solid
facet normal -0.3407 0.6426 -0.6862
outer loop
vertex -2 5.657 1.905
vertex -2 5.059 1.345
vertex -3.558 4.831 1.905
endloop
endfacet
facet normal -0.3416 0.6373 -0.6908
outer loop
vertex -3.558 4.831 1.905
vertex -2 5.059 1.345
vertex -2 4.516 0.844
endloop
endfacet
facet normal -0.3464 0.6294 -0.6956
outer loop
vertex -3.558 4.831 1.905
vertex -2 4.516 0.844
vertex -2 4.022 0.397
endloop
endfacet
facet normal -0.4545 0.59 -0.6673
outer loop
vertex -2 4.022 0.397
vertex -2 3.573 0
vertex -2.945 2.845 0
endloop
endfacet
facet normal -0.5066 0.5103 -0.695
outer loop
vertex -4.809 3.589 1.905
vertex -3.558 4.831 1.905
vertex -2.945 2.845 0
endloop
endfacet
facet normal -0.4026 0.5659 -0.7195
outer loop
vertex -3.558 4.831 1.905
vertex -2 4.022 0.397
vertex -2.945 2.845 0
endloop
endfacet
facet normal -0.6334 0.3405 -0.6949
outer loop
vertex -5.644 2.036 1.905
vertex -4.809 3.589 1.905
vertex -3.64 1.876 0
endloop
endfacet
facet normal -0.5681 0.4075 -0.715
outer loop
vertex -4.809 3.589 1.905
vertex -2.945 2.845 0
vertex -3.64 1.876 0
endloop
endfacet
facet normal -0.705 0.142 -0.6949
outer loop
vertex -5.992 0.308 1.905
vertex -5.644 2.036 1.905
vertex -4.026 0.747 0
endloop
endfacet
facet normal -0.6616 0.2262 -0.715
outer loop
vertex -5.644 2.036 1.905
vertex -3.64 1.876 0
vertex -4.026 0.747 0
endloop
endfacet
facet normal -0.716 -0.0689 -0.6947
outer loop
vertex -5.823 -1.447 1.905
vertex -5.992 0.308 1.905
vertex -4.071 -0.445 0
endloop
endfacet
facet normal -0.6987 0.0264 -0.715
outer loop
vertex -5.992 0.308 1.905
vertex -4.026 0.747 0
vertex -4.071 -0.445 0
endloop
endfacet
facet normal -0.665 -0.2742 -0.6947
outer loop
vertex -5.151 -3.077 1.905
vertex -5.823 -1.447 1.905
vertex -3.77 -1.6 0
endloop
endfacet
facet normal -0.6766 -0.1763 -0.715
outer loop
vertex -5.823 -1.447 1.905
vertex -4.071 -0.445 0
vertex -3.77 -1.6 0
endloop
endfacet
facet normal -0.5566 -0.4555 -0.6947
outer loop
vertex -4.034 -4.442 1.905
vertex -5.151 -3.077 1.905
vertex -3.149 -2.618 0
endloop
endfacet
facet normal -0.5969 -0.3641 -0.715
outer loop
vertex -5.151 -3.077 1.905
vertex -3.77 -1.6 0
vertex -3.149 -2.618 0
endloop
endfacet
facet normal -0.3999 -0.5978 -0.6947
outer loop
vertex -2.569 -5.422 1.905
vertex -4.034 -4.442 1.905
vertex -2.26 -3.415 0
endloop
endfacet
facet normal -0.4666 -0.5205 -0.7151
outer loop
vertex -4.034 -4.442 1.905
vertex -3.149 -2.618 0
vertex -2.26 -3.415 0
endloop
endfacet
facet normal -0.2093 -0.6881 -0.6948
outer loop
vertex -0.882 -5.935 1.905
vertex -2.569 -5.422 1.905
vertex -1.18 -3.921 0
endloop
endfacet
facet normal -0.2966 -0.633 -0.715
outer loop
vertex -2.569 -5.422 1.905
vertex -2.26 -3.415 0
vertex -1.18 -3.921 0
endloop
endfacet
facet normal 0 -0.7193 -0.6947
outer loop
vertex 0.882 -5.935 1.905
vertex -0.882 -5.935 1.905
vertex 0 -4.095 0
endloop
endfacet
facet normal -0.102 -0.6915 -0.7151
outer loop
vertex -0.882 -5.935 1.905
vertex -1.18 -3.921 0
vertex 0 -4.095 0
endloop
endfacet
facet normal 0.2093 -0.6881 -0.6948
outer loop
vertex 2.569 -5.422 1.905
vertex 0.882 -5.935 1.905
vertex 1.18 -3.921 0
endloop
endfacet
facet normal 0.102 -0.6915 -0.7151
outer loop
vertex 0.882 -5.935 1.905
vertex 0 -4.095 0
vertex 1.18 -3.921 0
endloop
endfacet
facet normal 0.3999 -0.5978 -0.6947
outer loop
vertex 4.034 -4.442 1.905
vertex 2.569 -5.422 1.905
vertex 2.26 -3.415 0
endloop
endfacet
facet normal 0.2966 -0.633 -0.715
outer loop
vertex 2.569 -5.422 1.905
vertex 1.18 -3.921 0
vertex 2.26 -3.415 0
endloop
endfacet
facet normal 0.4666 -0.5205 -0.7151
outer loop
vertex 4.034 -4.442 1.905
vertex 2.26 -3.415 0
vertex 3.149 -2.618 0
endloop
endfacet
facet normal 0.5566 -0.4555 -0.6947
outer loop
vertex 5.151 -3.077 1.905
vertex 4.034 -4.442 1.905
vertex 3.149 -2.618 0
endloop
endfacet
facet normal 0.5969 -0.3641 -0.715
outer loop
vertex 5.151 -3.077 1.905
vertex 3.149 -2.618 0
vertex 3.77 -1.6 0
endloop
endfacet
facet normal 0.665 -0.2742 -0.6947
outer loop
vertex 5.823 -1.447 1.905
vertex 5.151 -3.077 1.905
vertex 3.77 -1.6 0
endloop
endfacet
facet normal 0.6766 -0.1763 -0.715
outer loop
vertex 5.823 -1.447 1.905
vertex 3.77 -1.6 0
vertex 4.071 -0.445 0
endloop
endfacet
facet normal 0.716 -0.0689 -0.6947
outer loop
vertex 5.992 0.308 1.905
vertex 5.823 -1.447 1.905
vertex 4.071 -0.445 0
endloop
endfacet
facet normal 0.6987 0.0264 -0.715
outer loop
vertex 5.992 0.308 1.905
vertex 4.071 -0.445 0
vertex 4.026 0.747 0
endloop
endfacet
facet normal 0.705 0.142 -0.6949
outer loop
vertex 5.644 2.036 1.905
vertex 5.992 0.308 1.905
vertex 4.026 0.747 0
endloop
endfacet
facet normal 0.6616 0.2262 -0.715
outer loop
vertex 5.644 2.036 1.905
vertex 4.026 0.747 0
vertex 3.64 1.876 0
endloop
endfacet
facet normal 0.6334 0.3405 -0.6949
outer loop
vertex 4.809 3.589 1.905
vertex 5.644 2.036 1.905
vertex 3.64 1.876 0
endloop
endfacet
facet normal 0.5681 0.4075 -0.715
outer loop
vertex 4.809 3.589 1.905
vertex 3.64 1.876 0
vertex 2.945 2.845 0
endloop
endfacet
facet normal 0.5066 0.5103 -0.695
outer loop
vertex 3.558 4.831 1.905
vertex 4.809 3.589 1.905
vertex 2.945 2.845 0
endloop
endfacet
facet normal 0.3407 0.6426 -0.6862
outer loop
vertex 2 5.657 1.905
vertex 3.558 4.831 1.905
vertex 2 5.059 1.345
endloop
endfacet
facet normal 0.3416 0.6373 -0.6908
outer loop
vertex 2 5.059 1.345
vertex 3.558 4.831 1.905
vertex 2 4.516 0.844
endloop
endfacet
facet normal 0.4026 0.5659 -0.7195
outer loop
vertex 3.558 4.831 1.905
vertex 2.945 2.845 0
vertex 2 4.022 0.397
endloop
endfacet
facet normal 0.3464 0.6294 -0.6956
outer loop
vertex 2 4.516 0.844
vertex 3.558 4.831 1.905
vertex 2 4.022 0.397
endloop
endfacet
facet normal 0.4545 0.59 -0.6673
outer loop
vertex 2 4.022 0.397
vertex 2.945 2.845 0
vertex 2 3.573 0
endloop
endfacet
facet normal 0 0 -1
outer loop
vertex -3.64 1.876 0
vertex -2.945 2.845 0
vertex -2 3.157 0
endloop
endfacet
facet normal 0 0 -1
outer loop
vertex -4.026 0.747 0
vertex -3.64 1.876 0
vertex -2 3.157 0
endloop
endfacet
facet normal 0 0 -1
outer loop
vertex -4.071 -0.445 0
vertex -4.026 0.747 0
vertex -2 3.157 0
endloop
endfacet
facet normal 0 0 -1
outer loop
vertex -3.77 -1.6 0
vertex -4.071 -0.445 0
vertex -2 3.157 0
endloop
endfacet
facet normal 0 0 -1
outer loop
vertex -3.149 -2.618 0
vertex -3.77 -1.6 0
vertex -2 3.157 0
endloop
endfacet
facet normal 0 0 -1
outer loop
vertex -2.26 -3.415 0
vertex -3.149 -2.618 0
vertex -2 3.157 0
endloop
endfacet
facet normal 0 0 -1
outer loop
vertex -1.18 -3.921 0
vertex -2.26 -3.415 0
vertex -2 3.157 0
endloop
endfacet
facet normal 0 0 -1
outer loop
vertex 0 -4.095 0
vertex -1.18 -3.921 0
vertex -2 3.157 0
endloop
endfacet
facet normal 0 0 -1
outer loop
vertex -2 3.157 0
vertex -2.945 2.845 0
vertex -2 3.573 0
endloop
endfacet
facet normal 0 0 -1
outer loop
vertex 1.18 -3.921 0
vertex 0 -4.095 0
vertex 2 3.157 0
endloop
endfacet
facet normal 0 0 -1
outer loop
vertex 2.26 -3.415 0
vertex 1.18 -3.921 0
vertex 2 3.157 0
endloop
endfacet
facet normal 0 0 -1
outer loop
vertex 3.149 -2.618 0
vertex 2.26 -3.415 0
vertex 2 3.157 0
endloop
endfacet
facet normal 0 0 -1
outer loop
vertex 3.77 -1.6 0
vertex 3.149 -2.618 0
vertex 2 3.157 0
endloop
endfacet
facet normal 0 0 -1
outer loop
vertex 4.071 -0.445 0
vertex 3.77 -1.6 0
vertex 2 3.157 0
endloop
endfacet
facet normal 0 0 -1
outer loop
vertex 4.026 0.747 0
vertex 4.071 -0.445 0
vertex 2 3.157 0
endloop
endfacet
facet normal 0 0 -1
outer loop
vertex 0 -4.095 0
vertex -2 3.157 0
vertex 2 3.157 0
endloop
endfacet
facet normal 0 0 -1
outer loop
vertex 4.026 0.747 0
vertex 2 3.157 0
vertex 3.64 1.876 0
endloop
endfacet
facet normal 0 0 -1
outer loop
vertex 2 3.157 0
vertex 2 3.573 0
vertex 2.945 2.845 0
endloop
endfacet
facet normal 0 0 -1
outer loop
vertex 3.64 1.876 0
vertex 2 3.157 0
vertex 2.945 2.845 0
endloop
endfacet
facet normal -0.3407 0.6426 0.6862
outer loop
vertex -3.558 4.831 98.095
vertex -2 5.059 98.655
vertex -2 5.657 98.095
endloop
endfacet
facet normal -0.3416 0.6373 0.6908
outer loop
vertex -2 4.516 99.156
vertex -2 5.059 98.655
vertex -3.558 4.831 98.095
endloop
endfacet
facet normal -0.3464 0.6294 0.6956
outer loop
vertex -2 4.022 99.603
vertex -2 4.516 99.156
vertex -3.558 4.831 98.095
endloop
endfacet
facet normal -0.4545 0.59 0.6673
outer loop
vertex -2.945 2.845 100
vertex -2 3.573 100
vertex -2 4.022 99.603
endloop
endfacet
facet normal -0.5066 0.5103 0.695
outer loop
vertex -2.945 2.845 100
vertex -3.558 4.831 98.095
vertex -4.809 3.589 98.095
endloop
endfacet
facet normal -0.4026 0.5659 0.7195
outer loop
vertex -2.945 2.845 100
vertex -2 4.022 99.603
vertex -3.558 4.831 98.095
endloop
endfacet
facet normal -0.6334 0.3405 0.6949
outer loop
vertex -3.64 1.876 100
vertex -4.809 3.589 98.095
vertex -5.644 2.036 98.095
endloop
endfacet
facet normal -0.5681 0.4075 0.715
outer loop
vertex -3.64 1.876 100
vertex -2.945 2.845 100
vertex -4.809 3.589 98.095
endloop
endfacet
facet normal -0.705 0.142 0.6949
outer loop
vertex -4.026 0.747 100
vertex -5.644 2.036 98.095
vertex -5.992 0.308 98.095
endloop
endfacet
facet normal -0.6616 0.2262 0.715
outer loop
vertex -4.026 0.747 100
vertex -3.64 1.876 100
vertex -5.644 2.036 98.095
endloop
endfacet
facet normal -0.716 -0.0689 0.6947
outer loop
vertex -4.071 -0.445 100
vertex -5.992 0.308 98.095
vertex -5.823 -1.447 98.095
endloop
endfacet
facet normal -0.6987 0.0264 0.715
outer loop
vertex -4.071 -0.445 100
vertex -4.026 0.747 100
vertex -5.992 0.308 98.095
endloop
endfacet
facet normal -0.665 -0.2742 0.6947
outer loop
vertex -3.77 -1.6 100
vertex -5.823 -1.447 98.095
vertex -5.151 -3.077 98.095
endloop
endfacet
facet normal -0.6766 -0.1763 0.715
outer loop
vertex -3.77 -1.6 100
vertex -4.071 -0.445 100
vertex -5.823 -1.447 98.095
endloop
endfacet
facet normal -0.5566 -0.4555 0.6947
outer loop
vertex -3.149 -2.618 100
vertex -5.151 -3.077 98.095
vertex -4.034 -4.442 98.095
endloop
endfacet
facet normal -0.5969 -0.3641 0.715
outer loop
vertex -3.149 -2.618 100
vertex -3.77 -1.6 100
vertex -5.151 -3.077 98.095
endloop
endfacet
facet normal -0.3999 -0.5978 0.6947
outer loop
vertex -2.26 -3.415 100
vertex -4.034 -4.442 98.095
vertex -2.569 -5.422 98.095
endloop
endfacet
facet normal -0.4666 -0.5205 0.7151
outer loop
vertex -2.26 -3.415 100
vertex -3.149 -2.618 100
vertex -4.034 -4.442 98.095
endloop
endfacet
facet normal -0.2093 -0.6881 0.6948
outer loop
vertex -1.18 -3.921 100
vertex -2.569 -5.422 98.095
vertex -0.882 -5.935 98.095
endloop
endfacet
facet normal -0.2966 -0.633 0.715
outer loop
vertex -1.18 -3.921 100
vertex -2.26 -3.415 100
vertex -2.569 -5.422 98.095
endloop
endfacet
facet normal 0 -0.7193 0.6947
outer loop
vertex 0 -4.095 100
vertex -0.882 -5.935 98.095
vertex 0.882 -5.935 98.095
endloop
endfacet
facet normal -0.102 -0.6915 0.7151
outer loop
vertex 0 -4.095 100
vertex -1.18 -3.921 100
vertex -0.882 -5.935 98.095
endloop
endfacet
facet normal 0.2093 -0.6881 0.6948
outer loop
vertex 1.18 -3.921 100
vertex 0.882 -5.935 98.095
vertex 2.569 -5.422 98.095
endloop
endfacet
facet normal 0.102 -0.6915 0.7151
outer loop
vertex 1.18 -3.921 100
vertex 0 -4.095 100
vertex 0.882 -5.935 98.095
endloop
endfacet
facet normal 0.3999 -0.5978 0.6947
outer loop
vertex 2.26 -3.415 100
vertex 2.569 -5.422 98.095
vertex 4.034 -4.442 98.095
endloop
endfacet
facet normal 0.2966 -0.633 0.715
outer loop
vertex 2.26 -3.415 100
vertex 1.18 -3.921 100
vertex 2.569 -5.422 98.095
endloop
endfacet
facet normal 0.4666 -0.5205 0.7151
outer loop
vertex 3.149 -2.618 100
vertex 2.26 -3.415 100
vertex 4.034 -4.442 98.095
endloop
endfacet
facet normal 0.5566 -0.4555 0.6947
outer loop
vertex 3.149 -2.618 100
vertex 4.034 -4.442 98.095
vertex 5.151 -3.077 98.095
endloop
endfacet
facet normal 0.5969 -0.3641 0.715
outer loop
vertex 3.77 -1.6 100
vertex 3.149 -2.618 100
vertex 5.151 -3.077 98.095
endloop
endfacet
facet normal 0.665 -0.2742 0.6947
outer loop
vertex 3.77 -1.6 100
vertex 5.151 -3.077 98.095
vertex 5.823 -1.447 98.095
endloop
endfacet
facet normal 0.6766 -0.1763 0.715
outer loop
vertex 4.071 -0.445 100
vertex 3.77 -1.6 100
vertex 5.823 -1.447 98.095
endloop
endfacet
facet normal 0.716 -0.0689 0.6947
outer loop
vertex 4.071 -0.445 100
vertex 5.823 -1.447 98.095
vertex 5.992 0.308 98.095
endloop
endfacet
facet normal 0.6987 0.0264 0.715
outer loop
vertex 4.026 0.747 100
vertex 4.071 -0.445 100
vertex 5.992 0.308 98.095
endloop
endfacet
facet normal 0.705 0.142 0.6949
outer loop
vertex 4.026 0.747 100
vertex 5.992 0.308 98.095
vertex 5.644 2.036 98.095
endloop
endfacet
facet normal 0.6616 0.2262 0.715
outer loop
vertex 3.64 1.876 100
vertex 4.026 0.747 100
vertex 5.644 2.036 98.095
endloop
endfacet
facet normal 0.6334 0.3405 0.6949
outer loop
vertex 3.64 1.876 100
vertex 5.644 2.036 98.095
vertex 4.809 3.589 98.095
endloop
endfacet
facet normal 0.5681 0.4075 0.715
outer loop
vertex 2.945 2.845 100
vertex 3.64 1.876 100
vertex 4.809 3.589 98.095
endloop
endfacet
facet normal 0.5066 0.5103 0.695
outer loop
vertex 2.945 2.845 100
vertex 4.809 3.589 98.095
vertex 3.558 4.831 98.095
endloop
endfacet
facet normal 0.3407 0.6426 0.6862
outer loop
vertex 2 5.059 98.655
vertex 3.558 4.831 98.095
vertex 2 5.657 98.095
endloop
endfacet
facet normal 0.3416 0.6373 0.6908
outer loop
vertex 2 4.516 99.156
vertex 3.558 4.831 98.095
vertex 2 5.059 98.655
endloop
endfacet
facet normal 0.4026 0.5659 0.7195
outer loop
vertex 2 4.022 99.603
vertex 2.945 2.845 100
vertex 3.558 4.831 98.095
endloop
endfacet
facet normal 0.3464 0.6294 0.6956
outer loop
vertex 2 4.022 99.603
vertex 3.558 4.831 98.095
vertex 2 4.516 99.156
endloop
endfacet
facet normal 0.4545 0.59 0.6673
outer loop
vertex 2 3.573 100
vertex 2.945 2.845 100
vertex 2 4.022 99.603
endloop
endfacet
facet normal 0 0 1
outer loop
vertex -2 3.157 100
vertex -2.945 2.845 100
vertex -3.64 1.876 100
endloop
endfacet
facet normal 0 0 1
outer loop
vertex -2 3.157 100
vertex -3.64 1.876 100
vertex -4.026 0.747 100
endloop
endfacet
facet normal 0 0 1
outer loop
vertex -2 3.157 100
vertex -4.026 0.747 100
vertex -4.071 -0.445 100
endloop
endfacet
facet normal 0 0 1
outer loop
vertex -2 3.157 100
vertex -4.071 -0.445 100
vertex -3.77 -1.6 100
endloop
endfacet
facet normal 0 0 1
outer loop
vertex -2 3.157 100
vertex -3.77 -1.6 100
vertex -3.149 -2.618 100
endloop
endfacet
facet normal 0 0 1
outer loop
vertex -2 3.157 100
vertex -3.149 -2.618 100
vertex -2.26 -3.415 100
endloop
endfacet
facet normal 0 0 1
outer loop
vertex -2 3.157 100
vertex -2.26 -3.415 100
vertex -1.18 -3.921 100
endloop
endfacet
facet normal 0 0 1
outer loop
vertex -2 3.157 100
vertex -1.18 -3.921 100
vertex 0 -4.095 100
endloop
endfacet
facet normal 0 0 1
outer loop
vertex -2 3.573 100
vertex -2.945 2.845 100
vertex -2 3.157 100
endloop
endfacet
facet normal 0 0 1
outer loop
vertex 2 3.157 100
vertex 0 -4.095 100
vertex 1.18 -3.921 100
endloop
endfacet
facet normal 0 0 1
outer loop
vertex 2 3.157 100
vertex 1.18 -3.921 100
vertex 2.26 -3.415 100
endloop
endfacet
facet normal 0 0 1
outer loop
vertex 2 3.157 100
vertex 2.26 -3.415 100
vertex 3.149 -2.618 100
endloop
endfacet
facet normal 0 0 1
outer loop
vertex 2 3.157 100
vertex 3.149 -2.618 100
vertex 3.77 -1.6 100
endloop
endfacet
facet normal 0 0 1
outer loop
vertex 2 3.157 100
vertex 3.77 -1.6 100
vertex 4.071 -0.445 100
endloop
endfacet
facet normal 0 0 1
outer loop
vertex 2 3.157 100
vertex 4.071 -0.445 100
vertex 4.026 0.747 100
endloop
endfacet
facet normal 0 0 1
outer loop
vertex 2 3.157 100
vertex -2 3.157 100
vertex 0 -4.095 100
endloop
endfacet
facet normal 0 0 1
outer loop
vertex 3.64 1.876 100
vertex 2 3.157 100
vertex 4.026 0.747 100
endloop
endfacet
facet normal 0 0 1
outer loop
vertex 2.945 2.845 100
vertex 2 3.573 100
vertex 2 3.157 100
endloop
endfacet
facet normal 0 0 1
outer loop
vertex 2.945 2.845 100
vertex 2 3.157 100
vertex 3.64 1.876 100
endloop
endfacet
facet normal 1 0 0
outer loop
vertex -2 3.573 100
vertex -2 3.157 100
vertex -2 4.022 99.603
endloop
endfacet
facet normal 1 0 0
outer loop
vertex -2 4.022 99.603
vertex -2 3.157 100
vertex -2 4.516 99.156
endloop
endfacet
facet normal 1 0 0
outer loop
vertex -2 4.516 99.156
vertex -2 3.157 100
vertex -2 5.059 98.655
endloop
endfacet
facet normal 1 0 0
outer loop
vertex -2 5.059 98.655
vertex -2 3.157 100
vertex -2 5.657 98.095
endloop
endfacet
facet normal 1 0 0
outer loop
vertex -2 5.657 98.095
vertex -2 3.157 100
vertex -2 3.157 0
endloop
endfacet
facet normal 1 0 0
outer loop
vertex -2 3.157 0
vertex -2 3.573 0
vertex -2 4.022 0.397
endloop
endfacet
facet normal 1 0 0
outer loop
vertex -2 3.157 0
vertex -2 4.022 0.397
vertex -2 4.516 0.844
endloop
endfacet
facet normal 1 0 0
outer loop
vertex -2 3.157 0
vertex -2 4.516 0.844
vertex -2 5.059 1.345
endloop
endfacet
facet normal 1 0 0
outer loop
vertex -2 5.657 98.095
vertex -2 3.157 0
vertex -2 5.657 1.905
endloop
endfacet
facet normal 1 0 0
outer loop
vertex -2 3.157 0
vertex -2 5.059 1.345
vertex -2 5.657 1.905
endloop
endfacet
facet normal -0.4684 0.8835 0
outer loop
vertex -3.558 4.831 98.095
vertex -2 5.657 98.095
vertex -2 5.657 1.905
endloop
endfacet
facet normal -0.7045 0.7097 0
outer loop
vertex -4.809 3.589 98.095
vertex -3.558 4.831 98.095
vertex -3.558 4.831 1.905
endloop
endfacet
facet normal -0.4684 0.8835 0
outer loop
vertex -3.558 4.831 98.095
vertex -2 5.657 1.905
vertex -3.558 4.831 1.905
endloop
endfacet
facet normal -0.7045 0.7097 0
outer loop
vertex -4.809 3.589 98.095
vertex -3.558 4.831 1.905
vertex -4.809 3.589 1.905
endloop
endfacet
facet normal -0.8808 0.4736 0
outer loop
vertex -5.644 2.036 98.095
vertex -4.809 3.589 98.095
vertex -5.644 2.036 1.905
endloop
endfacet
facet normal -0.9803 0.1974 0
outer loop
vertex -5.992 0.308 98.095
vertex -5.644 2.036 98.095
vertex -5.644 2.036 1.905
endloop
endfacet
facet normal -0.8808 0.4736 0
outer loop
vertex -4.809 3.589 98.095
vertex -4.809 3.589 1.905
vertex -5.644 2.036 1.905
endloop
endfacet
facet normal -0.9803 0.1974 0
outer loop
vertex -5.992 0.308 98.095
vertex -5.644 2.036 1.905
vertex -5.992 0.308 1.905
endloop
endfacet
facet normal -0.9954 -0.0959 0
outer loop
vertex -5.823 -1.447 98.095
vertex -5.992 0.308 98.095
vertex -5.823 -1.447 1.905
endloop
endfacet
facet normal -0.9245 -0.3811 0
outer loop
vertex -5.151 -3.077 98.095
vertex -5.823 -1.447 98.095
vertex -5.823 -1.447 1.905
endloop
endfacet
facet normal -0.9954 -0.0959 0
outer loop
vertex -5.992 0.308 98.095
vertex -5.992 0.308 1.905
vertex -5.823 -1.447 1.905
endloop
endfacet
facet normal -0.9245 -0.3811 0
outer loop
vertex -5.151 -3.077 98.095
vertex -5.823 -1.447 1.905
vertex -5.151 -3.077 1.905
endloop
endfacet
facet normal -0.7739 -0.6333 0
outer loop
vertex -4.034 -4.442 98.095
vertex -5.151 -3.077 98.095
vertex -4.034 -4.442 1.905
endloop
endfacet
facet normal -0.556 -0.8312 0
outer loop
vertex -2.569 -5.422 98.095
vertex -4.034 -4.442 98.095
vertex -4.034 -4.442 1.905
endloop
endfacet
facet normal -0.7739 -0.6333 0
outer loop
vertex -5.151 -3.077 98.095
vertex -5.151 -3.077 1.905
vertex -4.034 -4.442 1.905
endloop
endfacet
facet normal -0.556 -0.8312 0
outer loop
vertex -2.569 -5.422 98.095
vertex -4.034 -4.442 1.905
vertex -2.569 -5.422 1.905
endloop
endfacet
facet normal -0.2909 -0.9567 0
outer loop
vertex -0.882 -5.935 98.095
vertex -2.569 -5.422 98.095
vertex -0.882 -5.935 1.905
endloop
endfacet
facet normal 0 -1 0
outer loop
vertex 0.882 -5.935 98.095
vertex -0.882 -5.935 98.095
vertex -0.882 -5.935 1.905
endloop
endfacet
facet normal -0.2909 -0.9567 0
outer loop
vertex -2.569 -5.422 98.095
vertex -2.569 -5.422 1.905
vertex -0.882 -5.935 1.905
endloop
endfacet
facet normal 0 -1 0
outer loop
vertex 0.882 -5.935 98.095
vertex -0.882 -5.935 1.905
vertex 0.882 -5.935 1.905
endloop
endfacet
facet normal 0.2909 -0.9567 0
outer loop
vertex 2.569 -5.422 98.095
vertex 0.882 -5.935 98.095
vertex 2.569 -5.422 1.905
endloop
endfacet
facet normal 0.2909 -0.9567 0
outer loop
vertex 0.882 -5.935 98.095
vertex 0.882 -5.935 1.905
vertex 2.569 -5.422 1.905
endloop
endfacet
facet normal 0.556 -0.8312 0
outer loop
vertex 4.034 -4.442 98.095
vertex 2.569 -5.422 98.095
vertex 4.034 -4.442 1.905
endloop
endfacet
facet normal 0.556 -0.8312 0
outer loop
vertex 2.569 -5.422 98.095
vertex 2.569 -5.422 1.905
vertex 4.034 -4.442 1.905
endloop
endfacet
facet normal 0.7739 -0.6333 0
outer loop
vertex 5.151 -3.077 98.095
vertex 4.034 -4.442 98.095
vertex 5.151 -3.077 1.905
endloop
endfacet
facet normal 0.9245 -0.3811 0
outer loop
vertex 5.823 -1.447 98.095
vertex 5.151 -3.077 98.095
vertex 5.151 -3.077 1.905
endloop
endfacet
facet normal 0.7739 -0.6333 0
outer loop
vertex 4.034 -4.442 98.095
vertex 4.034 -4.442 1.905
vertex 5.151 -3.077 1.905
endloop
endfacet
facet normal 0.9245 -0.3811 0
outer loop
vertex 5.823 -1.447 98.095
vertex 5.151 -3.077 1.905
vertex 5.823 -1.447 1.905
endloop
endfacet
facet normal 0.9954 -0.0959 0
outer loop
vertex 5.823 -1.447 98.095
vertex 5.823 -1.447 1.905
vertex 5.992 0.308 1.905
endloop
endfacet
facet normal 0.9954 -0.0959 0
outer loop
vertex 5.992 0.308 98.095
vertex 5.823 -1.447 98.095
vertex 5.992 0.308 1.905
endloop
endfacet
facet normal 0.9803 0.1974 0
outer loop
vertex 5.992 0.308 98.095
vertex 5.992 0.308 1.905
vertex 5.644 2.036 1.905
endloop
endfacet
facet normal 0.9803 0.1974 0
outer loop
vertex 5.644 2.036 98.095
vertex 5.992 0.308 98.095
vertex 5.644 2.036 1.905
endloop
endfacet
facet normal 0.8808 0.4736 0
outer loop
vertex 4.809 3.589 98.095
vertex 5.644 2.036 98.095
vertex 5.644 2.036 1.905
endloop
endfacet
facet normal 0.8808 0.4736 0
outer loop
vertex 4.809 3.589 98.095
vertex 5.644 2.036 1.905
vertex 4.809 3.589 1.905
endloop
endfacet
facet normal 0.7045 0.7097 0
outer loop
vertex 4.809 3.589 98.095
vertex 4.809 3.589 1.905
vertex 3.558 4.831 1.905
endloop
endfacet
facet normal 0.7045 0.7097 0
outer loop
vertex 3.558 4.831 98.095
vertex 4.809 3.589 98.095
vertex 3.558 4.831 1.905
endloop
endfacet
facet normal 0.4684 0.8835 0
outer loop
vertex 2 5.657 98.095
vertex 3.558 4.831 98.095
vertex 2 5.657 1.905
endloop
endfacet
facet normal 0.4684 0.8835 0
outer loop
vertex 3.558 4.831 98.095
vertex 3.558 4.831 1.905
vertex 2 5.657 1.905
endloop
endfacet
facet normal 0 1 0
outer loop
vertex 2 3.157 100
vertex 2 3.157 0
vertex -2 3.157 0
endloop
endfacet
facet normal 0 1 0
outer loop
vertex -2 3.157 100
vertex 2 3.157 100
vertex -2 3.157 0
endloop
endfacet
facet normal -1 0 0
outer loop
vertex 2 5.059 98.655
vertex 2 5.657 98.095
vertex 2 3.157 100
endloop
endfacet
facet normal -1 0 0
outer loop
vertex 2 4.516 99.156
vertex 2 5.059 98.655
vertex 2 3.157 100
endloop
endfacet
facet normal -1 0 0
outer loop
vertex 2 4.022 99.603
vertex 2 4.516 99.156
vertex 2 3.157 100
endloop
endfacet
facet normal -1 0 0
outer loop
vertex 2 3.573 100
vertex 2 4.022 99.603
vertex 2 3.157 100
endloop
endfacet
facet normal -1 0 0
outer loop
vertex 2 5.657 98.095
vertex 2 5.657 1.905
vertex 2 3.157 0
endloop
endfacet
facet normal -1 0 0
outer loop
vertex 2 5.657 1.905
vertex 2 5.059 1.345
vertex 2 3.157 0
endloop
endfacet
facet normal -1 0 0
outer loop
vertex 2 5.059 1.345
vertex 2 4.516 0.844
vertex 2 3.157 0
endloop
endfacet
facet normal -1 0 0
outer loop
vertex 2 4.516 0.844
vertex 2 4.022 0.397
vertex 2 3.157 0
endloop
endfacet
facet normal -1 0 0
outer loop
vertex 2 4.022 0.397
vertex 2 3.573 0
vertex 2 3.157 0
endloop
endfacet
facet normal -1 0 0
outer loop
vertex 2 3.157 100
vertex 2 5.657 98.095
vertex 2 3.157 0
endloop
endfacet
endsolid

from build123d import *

# Parameters (mm, degrees)
BOSS_EXTRUDE1_DEPTH = 100
CHAMFER1_SIZE       = 1.905


with BuildPart() as part:
    # Sketch3 → Boss-Extrude1 (new body)
    with BuildSketch(Plane.XY):
        with BuildLine():
            Line((-2, 3.156854249), (-2, 5.656854249))
            ThreePointArc((-2, 5.656854249), (0, -6), (2, 5.656854249))
            Line((2, 5.656854249), (2, 3.156854249))
            Line((2, 3.156854249), (-2, 3.156854249))
        make_face()
    extrude(amount=BOSS_EXTRUDE1_DEPTH)

    # Chamfer1
    chamfer1_edges = [part.edges().sort_by_distance(p)[0] for p in [
        (0, -6, 100),
        (0, -6, 0),
    ]]
    chamfer(chamfer1_edges, length=CHAMFER1_SIZE)


solid = part.part
